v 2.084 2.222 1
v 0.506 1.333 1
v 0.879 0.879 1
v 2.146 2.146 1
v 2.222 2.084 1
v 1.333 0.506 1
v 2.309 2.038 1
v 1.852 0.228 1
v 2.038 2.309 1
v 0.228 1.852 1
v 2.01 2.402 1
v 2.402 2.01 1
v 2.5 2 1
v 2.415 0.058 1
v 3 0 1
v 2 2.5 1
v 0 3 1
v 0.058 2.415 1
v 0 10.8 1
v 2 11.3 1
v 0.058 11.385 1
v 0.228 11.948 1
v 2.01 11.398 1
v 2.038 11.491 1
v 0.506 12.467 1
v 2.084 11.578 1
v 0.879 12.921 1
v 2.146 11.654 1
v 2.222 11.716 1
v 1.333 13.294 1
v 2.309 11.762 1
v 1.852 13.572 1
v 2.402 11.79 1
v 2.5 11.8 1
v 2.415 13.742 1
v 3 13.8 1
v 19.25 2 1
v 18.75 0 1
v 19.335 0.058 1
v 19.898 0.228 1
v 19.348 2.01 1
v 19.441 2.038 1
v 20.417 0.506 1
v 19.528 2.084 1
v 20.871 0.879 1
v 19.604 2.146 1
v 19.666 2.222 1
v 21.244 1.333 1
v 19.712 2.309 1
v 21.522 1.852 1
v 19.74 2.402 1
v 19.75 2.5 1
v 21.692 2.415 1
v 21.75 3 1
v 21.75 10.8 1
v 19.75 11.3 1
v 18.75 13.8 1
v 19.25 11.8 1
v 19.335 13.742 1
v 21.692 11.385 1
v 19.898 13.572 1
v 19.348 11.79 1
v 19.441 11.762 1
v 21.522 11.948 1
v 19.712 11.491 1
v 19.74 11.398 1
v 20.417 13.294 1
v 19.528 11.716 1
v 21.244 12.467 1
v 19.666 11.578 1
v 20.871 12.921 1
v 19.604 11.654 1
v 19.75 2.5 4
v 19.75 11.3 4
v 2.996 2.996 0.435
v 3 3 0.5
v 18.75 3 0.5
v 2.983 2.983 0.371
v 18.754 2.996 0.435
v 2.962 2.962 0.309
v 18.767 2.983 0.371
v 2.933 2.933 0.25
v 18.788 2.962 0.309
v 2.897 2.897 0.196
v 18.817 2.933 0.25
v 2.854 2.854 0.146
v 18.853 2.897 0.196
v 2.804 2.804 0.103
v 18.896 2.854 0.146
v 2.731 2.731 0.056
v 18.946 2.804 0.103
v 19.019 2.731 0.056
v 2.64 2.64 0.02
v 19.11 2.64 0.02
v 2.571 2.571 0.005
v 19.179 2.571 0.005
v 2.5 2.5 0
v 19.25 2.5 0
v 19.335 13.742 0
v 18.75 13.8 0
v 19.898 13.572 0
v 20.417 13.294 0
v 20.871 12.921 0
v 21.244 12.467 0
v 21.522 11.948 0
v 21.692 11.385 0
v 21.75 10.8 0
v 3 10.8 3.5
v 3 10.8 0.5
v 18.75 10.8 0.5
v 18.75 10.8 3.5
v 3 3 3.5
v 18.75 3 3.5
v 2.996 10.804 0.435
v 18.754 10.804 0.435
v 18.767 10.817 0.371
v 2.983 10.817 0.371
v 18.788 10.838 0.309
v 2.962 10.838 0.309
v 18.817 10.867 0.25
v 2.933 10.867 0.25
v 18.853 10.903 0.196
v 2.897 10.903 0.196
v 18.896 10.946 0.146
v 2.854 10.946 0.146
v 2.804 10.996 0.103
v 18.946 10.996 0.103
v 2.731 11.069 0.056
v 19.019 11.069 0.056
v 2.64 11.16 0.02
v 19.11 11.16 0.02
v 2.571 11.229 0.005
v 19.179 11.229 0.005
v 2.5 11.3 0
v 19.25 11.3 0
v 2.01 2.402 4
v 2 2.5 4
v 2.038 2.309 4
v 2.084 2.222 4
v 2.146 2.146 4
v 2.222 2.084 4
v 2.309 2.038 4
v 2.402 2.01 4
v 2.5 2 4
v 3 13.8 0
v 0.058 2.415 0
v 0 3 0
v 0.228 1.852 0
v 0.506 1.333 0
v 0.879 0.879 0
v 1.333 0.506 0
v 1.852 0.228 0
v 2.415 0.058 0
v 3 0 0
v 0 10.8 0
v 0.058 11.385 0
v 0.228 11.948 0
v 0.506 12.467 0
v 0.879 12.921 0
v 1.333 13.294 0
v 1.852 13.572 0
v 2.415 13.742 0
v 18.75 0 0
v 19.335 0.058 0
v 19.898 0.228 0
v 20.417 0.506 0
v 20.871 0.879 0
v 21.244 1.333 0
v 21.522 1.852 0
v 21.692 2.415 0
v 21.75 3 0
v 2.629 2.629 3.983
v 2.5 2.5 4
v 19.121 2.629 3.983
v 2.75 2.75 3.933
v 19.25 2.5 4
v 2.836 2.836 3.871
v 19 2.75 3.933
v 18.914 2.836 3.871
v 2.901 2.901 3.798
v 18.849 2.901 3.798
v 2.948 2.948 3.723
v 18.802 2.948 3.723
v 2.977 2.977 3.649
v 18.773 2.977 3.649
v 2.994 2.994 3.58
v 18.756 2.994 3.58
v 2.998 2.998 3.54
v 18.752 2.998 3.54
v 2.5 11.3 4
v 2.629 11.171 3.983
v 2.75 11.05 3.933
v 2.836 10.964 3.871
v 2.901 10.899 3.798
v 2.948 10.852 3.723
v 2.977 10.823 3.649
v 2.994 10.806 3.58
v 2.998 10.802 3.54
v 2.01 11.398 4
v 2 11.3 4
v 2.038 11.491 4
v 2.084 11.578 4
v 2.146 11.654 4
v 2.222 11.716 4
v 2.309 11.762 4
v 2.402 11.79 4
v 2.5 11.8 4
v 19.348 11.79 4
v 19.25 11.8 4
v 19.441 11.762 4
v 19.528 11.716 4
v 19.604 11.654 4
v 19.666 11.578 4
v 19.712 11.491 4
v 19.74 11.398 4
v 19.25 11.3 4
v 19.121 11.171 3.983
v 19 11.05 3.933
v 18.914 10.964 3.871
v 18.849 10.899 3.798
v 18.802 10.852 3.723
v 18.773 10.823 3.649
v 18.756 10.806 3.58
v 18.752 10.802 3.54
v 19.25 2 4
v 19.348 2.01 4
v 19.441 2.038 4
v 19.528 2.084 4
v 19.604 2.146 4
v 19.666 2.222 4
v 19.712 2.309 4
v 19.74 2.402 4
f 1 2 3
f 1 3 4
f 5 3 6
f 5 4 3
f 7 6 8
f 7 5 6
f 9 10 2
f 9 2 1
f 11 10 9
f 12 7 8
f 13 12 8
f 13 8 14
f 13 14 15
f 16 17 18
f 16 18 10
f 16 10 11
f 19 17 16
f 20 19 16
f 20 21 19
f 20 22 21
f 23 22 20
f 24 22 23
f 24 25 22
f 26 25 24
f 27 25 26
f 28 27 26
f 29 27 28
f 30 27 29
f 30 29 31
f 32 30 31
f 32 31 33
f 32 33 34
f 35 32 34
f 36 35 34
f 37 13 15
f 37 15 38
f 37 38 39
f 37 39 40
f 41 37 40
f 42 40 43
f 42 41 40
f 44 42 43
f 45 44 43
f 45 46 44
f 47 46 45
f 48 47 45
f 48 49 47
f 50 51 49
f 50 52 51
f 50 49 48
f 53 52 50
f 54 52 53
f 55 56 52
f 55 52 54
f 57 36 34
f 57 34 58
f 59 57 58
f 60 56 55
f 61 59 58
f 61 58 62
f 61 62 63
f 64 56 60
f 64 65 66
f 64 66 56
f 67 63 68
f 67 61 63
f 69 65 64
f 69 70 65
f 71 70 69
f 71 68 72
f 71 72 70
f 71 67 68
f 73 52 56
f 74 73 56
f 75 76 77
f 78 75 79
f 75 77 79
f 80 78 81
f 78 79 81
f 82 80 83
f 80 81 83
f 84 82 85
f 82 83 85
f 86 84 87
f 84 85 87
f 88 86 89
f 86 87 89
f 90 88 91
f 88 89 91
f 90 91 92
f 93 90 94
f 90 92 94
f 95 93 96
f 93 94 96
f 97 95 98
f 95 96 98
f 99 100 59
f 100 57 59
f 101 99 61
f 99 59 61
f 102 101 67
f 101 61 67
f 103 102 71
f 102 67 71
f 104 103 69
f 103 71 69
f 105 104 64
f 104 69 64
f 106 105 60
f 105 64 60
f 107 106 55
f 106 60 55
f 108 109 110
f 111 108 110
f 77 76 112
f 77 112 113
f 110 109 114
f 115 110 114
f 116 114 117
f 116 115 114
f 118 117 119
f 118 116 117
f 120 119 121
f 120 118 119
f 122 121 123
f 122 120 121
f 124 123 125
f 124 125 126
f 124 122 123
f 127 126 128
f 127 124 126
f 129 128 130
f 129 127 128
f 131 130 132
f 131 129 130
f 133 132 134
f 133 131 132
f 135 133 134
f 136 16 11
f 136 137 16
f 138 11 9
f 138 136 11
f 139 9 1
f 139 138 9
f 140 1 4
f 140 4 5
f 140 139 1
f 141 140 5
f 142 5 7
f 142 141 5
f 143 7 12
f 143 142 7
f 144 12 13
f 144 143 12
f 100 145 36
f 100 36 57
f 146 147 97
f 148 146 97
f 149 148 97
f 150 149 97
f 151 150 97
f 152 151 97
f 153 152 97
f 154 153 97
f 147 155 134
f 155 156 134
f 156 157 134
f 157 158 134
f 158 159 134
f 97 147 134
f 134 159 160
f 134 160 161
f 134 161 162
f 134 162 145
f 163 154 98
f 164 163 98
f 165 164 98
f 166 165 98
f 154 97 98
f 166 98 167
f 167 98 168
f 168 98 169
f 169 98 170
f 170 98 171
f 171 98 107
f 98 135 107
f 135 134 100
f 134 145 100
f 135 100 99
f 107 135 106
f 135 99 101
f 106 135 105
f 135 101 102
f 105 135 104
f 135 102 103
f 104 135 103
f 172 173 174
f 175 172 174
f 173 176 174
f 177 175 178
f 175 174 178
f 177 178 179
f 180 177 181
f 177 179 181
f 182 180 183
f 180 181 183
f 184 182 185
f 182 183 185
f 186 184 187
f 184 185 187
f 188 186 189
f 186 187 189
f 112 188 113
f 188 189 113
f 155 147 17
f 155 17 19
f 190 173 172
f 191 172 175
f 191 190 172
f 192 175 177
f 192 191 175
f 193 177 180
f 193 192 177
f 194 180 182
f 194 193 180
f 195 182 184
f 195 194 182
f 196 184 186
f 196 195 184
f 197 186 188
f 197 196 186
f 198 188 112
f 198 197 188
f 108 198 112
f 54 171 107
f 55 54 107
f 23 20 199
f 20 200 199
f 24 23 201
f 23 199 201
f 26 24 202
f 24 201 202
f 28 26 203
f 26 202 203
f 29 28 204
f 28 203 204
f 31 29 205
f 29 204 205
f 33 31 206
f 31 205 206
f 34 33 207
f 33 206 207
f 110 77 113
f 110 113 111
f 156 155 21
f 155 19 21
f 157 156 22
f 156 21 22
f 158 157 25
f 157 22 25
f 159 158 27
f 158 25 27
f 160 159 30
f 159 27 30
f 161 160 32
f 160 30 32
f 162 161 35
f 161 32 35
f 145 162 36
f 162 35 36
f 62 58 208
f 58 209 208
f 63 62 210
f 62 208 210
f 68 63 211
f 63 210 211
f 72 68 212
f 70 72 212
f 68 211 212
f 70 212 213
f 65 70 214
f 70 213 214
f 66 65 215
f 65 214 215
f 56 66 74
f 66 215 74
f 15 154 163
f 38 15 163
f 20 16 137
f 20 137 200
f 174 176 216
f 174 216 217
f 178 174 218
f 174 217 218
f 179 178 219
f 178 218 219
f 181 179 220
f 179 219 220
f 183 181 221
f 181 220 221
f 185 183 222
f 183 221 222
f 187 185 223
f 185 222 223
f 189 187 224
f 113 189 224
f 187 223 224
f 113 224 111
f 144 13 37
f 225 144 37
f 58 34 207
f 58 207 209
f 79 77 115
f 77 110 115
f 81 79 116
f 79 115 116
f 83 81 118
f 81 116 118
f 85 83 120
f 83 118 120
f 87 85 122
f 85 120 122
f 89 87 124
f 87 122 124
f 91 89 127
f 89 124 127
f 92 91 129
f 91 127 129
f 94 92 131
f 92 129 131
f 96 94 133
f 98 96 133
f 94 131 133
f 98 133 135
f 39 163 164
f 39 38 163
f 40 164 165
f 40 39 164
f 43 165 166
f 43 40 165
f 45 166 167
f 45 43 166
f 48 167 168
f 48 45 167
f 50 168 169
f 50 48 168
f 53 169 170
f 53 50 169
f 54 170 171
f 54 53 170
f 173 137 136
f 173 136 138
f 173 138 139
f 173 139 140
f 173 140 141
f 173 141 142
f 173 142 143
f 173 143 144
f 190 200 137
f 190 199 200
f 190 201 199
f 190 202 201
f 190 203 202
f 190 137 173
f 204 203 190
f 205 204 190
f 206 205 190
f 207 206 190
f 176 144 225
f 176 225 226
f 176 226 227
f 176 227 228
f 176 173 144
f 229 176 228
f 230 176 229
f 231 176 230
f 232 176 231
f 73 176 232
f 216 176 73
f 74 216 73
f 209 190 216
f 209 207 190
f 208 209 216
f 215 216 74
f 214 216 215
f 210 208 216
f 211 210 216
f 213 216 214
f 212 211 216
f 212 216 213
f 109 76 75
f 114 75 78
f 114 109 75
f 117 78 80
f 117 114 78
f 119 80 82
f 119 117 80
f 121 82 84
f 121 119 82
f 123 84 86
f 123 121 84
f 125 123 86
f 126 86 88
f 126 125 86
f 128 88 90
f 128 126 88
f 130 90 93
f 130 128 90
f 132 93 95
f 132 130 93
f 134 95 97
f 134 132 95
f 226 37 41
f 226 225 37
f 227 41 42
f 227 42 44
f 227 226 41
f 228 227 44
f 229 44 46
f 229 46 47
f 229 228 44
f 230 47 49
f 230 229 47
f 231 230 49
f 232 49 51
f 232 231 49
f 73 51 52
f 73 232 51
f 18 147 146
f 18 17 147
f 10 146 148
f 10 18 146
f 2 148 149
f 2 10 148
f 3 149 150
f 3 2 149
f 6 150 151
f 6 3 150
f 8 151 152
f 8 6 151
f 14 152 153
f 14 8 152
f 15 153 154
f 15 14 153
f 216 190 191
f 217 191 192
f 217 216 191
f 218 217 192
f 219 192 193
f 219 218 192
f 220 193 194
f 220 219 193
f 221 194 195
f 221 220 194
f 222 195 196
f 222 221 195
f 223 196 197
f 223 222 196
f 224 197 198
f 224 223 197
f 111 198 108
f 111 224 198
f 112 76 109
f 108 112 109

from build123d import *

# Parameters (mm, degrees)
F0_W     = 21.75
F0_H     = 13.8
F0_W_2   = 17.75
F0_H_2   = 9.8
F1_DEPTH = 1
F0_W_3   = 15.75
F0_H_3   = 7.8
F2_DEPTH = 4
F3_R     = 0.5
F4_R     = 0.5
F5_R     = 3


with BuildPart() as f1:
    # F0 (on Top) → F1 (new body)
    with BuildSketch(Plane.XY):
        with Locations((10.875, 6.9)):
            Rectangle(F0_W, F0_H)
        with Locations((10.875, 6.9)):
            Rectangle(F0_W_2, F0_H_2, mode=Mode.SUBTRACT)
    extrude(amount=F1_DEPTH)

    # F0 (on Top) → F2 (join)
    with BuildSketch(Plane.XY):
        with Locations((10.875, 6.9)):
            Rectangle(F0_W_2, F0_H_2)
        with Locations((10.875, 6.9)):
            Rectangle(F0_W_3, F0_H_3, mode=Mode.SUBTRACT)
    extrude(amount=F2_DEPTH)

    # F3
    f3_edges = [f1.edges().sort_by_distance(p)[0] for p in [
        (10.875, 10.8, 4),
        (18.75, 6.9, 4),
        (10.875, 3, 4),
        (3, 6.9, 4),
        (10.875, 10.8, 0),
        (3, 6.9, 0),
        (10.875, 3, 0),
        (18.75, 6.9, 0),
    ]]
    fillet(f3_edges, radius=F3_R)

    # F4
    f4_edges = [f1.edges().sort_by_distance(p)[0] for p in [
        (2, 11.8, 2.5),
        (2, 2, 2.5),
        (19.75, 2, 2.5),
        (19.75, 11.8, 2.5),
    ]]
    fillet(f4_edges, radius=F4_R)

    # F5
    f5_edges = [f1.edges().sort_by_distance(p)[0] for p in [
        (0, 13.8, 0.5),
        (21.75, 13.8, 0.5),
        (21.75, 0, 0.5),
        (0, 0, 0.5),
    ]]
    fillet(f5_edges, radius=F5_R)


solid = f1.part
